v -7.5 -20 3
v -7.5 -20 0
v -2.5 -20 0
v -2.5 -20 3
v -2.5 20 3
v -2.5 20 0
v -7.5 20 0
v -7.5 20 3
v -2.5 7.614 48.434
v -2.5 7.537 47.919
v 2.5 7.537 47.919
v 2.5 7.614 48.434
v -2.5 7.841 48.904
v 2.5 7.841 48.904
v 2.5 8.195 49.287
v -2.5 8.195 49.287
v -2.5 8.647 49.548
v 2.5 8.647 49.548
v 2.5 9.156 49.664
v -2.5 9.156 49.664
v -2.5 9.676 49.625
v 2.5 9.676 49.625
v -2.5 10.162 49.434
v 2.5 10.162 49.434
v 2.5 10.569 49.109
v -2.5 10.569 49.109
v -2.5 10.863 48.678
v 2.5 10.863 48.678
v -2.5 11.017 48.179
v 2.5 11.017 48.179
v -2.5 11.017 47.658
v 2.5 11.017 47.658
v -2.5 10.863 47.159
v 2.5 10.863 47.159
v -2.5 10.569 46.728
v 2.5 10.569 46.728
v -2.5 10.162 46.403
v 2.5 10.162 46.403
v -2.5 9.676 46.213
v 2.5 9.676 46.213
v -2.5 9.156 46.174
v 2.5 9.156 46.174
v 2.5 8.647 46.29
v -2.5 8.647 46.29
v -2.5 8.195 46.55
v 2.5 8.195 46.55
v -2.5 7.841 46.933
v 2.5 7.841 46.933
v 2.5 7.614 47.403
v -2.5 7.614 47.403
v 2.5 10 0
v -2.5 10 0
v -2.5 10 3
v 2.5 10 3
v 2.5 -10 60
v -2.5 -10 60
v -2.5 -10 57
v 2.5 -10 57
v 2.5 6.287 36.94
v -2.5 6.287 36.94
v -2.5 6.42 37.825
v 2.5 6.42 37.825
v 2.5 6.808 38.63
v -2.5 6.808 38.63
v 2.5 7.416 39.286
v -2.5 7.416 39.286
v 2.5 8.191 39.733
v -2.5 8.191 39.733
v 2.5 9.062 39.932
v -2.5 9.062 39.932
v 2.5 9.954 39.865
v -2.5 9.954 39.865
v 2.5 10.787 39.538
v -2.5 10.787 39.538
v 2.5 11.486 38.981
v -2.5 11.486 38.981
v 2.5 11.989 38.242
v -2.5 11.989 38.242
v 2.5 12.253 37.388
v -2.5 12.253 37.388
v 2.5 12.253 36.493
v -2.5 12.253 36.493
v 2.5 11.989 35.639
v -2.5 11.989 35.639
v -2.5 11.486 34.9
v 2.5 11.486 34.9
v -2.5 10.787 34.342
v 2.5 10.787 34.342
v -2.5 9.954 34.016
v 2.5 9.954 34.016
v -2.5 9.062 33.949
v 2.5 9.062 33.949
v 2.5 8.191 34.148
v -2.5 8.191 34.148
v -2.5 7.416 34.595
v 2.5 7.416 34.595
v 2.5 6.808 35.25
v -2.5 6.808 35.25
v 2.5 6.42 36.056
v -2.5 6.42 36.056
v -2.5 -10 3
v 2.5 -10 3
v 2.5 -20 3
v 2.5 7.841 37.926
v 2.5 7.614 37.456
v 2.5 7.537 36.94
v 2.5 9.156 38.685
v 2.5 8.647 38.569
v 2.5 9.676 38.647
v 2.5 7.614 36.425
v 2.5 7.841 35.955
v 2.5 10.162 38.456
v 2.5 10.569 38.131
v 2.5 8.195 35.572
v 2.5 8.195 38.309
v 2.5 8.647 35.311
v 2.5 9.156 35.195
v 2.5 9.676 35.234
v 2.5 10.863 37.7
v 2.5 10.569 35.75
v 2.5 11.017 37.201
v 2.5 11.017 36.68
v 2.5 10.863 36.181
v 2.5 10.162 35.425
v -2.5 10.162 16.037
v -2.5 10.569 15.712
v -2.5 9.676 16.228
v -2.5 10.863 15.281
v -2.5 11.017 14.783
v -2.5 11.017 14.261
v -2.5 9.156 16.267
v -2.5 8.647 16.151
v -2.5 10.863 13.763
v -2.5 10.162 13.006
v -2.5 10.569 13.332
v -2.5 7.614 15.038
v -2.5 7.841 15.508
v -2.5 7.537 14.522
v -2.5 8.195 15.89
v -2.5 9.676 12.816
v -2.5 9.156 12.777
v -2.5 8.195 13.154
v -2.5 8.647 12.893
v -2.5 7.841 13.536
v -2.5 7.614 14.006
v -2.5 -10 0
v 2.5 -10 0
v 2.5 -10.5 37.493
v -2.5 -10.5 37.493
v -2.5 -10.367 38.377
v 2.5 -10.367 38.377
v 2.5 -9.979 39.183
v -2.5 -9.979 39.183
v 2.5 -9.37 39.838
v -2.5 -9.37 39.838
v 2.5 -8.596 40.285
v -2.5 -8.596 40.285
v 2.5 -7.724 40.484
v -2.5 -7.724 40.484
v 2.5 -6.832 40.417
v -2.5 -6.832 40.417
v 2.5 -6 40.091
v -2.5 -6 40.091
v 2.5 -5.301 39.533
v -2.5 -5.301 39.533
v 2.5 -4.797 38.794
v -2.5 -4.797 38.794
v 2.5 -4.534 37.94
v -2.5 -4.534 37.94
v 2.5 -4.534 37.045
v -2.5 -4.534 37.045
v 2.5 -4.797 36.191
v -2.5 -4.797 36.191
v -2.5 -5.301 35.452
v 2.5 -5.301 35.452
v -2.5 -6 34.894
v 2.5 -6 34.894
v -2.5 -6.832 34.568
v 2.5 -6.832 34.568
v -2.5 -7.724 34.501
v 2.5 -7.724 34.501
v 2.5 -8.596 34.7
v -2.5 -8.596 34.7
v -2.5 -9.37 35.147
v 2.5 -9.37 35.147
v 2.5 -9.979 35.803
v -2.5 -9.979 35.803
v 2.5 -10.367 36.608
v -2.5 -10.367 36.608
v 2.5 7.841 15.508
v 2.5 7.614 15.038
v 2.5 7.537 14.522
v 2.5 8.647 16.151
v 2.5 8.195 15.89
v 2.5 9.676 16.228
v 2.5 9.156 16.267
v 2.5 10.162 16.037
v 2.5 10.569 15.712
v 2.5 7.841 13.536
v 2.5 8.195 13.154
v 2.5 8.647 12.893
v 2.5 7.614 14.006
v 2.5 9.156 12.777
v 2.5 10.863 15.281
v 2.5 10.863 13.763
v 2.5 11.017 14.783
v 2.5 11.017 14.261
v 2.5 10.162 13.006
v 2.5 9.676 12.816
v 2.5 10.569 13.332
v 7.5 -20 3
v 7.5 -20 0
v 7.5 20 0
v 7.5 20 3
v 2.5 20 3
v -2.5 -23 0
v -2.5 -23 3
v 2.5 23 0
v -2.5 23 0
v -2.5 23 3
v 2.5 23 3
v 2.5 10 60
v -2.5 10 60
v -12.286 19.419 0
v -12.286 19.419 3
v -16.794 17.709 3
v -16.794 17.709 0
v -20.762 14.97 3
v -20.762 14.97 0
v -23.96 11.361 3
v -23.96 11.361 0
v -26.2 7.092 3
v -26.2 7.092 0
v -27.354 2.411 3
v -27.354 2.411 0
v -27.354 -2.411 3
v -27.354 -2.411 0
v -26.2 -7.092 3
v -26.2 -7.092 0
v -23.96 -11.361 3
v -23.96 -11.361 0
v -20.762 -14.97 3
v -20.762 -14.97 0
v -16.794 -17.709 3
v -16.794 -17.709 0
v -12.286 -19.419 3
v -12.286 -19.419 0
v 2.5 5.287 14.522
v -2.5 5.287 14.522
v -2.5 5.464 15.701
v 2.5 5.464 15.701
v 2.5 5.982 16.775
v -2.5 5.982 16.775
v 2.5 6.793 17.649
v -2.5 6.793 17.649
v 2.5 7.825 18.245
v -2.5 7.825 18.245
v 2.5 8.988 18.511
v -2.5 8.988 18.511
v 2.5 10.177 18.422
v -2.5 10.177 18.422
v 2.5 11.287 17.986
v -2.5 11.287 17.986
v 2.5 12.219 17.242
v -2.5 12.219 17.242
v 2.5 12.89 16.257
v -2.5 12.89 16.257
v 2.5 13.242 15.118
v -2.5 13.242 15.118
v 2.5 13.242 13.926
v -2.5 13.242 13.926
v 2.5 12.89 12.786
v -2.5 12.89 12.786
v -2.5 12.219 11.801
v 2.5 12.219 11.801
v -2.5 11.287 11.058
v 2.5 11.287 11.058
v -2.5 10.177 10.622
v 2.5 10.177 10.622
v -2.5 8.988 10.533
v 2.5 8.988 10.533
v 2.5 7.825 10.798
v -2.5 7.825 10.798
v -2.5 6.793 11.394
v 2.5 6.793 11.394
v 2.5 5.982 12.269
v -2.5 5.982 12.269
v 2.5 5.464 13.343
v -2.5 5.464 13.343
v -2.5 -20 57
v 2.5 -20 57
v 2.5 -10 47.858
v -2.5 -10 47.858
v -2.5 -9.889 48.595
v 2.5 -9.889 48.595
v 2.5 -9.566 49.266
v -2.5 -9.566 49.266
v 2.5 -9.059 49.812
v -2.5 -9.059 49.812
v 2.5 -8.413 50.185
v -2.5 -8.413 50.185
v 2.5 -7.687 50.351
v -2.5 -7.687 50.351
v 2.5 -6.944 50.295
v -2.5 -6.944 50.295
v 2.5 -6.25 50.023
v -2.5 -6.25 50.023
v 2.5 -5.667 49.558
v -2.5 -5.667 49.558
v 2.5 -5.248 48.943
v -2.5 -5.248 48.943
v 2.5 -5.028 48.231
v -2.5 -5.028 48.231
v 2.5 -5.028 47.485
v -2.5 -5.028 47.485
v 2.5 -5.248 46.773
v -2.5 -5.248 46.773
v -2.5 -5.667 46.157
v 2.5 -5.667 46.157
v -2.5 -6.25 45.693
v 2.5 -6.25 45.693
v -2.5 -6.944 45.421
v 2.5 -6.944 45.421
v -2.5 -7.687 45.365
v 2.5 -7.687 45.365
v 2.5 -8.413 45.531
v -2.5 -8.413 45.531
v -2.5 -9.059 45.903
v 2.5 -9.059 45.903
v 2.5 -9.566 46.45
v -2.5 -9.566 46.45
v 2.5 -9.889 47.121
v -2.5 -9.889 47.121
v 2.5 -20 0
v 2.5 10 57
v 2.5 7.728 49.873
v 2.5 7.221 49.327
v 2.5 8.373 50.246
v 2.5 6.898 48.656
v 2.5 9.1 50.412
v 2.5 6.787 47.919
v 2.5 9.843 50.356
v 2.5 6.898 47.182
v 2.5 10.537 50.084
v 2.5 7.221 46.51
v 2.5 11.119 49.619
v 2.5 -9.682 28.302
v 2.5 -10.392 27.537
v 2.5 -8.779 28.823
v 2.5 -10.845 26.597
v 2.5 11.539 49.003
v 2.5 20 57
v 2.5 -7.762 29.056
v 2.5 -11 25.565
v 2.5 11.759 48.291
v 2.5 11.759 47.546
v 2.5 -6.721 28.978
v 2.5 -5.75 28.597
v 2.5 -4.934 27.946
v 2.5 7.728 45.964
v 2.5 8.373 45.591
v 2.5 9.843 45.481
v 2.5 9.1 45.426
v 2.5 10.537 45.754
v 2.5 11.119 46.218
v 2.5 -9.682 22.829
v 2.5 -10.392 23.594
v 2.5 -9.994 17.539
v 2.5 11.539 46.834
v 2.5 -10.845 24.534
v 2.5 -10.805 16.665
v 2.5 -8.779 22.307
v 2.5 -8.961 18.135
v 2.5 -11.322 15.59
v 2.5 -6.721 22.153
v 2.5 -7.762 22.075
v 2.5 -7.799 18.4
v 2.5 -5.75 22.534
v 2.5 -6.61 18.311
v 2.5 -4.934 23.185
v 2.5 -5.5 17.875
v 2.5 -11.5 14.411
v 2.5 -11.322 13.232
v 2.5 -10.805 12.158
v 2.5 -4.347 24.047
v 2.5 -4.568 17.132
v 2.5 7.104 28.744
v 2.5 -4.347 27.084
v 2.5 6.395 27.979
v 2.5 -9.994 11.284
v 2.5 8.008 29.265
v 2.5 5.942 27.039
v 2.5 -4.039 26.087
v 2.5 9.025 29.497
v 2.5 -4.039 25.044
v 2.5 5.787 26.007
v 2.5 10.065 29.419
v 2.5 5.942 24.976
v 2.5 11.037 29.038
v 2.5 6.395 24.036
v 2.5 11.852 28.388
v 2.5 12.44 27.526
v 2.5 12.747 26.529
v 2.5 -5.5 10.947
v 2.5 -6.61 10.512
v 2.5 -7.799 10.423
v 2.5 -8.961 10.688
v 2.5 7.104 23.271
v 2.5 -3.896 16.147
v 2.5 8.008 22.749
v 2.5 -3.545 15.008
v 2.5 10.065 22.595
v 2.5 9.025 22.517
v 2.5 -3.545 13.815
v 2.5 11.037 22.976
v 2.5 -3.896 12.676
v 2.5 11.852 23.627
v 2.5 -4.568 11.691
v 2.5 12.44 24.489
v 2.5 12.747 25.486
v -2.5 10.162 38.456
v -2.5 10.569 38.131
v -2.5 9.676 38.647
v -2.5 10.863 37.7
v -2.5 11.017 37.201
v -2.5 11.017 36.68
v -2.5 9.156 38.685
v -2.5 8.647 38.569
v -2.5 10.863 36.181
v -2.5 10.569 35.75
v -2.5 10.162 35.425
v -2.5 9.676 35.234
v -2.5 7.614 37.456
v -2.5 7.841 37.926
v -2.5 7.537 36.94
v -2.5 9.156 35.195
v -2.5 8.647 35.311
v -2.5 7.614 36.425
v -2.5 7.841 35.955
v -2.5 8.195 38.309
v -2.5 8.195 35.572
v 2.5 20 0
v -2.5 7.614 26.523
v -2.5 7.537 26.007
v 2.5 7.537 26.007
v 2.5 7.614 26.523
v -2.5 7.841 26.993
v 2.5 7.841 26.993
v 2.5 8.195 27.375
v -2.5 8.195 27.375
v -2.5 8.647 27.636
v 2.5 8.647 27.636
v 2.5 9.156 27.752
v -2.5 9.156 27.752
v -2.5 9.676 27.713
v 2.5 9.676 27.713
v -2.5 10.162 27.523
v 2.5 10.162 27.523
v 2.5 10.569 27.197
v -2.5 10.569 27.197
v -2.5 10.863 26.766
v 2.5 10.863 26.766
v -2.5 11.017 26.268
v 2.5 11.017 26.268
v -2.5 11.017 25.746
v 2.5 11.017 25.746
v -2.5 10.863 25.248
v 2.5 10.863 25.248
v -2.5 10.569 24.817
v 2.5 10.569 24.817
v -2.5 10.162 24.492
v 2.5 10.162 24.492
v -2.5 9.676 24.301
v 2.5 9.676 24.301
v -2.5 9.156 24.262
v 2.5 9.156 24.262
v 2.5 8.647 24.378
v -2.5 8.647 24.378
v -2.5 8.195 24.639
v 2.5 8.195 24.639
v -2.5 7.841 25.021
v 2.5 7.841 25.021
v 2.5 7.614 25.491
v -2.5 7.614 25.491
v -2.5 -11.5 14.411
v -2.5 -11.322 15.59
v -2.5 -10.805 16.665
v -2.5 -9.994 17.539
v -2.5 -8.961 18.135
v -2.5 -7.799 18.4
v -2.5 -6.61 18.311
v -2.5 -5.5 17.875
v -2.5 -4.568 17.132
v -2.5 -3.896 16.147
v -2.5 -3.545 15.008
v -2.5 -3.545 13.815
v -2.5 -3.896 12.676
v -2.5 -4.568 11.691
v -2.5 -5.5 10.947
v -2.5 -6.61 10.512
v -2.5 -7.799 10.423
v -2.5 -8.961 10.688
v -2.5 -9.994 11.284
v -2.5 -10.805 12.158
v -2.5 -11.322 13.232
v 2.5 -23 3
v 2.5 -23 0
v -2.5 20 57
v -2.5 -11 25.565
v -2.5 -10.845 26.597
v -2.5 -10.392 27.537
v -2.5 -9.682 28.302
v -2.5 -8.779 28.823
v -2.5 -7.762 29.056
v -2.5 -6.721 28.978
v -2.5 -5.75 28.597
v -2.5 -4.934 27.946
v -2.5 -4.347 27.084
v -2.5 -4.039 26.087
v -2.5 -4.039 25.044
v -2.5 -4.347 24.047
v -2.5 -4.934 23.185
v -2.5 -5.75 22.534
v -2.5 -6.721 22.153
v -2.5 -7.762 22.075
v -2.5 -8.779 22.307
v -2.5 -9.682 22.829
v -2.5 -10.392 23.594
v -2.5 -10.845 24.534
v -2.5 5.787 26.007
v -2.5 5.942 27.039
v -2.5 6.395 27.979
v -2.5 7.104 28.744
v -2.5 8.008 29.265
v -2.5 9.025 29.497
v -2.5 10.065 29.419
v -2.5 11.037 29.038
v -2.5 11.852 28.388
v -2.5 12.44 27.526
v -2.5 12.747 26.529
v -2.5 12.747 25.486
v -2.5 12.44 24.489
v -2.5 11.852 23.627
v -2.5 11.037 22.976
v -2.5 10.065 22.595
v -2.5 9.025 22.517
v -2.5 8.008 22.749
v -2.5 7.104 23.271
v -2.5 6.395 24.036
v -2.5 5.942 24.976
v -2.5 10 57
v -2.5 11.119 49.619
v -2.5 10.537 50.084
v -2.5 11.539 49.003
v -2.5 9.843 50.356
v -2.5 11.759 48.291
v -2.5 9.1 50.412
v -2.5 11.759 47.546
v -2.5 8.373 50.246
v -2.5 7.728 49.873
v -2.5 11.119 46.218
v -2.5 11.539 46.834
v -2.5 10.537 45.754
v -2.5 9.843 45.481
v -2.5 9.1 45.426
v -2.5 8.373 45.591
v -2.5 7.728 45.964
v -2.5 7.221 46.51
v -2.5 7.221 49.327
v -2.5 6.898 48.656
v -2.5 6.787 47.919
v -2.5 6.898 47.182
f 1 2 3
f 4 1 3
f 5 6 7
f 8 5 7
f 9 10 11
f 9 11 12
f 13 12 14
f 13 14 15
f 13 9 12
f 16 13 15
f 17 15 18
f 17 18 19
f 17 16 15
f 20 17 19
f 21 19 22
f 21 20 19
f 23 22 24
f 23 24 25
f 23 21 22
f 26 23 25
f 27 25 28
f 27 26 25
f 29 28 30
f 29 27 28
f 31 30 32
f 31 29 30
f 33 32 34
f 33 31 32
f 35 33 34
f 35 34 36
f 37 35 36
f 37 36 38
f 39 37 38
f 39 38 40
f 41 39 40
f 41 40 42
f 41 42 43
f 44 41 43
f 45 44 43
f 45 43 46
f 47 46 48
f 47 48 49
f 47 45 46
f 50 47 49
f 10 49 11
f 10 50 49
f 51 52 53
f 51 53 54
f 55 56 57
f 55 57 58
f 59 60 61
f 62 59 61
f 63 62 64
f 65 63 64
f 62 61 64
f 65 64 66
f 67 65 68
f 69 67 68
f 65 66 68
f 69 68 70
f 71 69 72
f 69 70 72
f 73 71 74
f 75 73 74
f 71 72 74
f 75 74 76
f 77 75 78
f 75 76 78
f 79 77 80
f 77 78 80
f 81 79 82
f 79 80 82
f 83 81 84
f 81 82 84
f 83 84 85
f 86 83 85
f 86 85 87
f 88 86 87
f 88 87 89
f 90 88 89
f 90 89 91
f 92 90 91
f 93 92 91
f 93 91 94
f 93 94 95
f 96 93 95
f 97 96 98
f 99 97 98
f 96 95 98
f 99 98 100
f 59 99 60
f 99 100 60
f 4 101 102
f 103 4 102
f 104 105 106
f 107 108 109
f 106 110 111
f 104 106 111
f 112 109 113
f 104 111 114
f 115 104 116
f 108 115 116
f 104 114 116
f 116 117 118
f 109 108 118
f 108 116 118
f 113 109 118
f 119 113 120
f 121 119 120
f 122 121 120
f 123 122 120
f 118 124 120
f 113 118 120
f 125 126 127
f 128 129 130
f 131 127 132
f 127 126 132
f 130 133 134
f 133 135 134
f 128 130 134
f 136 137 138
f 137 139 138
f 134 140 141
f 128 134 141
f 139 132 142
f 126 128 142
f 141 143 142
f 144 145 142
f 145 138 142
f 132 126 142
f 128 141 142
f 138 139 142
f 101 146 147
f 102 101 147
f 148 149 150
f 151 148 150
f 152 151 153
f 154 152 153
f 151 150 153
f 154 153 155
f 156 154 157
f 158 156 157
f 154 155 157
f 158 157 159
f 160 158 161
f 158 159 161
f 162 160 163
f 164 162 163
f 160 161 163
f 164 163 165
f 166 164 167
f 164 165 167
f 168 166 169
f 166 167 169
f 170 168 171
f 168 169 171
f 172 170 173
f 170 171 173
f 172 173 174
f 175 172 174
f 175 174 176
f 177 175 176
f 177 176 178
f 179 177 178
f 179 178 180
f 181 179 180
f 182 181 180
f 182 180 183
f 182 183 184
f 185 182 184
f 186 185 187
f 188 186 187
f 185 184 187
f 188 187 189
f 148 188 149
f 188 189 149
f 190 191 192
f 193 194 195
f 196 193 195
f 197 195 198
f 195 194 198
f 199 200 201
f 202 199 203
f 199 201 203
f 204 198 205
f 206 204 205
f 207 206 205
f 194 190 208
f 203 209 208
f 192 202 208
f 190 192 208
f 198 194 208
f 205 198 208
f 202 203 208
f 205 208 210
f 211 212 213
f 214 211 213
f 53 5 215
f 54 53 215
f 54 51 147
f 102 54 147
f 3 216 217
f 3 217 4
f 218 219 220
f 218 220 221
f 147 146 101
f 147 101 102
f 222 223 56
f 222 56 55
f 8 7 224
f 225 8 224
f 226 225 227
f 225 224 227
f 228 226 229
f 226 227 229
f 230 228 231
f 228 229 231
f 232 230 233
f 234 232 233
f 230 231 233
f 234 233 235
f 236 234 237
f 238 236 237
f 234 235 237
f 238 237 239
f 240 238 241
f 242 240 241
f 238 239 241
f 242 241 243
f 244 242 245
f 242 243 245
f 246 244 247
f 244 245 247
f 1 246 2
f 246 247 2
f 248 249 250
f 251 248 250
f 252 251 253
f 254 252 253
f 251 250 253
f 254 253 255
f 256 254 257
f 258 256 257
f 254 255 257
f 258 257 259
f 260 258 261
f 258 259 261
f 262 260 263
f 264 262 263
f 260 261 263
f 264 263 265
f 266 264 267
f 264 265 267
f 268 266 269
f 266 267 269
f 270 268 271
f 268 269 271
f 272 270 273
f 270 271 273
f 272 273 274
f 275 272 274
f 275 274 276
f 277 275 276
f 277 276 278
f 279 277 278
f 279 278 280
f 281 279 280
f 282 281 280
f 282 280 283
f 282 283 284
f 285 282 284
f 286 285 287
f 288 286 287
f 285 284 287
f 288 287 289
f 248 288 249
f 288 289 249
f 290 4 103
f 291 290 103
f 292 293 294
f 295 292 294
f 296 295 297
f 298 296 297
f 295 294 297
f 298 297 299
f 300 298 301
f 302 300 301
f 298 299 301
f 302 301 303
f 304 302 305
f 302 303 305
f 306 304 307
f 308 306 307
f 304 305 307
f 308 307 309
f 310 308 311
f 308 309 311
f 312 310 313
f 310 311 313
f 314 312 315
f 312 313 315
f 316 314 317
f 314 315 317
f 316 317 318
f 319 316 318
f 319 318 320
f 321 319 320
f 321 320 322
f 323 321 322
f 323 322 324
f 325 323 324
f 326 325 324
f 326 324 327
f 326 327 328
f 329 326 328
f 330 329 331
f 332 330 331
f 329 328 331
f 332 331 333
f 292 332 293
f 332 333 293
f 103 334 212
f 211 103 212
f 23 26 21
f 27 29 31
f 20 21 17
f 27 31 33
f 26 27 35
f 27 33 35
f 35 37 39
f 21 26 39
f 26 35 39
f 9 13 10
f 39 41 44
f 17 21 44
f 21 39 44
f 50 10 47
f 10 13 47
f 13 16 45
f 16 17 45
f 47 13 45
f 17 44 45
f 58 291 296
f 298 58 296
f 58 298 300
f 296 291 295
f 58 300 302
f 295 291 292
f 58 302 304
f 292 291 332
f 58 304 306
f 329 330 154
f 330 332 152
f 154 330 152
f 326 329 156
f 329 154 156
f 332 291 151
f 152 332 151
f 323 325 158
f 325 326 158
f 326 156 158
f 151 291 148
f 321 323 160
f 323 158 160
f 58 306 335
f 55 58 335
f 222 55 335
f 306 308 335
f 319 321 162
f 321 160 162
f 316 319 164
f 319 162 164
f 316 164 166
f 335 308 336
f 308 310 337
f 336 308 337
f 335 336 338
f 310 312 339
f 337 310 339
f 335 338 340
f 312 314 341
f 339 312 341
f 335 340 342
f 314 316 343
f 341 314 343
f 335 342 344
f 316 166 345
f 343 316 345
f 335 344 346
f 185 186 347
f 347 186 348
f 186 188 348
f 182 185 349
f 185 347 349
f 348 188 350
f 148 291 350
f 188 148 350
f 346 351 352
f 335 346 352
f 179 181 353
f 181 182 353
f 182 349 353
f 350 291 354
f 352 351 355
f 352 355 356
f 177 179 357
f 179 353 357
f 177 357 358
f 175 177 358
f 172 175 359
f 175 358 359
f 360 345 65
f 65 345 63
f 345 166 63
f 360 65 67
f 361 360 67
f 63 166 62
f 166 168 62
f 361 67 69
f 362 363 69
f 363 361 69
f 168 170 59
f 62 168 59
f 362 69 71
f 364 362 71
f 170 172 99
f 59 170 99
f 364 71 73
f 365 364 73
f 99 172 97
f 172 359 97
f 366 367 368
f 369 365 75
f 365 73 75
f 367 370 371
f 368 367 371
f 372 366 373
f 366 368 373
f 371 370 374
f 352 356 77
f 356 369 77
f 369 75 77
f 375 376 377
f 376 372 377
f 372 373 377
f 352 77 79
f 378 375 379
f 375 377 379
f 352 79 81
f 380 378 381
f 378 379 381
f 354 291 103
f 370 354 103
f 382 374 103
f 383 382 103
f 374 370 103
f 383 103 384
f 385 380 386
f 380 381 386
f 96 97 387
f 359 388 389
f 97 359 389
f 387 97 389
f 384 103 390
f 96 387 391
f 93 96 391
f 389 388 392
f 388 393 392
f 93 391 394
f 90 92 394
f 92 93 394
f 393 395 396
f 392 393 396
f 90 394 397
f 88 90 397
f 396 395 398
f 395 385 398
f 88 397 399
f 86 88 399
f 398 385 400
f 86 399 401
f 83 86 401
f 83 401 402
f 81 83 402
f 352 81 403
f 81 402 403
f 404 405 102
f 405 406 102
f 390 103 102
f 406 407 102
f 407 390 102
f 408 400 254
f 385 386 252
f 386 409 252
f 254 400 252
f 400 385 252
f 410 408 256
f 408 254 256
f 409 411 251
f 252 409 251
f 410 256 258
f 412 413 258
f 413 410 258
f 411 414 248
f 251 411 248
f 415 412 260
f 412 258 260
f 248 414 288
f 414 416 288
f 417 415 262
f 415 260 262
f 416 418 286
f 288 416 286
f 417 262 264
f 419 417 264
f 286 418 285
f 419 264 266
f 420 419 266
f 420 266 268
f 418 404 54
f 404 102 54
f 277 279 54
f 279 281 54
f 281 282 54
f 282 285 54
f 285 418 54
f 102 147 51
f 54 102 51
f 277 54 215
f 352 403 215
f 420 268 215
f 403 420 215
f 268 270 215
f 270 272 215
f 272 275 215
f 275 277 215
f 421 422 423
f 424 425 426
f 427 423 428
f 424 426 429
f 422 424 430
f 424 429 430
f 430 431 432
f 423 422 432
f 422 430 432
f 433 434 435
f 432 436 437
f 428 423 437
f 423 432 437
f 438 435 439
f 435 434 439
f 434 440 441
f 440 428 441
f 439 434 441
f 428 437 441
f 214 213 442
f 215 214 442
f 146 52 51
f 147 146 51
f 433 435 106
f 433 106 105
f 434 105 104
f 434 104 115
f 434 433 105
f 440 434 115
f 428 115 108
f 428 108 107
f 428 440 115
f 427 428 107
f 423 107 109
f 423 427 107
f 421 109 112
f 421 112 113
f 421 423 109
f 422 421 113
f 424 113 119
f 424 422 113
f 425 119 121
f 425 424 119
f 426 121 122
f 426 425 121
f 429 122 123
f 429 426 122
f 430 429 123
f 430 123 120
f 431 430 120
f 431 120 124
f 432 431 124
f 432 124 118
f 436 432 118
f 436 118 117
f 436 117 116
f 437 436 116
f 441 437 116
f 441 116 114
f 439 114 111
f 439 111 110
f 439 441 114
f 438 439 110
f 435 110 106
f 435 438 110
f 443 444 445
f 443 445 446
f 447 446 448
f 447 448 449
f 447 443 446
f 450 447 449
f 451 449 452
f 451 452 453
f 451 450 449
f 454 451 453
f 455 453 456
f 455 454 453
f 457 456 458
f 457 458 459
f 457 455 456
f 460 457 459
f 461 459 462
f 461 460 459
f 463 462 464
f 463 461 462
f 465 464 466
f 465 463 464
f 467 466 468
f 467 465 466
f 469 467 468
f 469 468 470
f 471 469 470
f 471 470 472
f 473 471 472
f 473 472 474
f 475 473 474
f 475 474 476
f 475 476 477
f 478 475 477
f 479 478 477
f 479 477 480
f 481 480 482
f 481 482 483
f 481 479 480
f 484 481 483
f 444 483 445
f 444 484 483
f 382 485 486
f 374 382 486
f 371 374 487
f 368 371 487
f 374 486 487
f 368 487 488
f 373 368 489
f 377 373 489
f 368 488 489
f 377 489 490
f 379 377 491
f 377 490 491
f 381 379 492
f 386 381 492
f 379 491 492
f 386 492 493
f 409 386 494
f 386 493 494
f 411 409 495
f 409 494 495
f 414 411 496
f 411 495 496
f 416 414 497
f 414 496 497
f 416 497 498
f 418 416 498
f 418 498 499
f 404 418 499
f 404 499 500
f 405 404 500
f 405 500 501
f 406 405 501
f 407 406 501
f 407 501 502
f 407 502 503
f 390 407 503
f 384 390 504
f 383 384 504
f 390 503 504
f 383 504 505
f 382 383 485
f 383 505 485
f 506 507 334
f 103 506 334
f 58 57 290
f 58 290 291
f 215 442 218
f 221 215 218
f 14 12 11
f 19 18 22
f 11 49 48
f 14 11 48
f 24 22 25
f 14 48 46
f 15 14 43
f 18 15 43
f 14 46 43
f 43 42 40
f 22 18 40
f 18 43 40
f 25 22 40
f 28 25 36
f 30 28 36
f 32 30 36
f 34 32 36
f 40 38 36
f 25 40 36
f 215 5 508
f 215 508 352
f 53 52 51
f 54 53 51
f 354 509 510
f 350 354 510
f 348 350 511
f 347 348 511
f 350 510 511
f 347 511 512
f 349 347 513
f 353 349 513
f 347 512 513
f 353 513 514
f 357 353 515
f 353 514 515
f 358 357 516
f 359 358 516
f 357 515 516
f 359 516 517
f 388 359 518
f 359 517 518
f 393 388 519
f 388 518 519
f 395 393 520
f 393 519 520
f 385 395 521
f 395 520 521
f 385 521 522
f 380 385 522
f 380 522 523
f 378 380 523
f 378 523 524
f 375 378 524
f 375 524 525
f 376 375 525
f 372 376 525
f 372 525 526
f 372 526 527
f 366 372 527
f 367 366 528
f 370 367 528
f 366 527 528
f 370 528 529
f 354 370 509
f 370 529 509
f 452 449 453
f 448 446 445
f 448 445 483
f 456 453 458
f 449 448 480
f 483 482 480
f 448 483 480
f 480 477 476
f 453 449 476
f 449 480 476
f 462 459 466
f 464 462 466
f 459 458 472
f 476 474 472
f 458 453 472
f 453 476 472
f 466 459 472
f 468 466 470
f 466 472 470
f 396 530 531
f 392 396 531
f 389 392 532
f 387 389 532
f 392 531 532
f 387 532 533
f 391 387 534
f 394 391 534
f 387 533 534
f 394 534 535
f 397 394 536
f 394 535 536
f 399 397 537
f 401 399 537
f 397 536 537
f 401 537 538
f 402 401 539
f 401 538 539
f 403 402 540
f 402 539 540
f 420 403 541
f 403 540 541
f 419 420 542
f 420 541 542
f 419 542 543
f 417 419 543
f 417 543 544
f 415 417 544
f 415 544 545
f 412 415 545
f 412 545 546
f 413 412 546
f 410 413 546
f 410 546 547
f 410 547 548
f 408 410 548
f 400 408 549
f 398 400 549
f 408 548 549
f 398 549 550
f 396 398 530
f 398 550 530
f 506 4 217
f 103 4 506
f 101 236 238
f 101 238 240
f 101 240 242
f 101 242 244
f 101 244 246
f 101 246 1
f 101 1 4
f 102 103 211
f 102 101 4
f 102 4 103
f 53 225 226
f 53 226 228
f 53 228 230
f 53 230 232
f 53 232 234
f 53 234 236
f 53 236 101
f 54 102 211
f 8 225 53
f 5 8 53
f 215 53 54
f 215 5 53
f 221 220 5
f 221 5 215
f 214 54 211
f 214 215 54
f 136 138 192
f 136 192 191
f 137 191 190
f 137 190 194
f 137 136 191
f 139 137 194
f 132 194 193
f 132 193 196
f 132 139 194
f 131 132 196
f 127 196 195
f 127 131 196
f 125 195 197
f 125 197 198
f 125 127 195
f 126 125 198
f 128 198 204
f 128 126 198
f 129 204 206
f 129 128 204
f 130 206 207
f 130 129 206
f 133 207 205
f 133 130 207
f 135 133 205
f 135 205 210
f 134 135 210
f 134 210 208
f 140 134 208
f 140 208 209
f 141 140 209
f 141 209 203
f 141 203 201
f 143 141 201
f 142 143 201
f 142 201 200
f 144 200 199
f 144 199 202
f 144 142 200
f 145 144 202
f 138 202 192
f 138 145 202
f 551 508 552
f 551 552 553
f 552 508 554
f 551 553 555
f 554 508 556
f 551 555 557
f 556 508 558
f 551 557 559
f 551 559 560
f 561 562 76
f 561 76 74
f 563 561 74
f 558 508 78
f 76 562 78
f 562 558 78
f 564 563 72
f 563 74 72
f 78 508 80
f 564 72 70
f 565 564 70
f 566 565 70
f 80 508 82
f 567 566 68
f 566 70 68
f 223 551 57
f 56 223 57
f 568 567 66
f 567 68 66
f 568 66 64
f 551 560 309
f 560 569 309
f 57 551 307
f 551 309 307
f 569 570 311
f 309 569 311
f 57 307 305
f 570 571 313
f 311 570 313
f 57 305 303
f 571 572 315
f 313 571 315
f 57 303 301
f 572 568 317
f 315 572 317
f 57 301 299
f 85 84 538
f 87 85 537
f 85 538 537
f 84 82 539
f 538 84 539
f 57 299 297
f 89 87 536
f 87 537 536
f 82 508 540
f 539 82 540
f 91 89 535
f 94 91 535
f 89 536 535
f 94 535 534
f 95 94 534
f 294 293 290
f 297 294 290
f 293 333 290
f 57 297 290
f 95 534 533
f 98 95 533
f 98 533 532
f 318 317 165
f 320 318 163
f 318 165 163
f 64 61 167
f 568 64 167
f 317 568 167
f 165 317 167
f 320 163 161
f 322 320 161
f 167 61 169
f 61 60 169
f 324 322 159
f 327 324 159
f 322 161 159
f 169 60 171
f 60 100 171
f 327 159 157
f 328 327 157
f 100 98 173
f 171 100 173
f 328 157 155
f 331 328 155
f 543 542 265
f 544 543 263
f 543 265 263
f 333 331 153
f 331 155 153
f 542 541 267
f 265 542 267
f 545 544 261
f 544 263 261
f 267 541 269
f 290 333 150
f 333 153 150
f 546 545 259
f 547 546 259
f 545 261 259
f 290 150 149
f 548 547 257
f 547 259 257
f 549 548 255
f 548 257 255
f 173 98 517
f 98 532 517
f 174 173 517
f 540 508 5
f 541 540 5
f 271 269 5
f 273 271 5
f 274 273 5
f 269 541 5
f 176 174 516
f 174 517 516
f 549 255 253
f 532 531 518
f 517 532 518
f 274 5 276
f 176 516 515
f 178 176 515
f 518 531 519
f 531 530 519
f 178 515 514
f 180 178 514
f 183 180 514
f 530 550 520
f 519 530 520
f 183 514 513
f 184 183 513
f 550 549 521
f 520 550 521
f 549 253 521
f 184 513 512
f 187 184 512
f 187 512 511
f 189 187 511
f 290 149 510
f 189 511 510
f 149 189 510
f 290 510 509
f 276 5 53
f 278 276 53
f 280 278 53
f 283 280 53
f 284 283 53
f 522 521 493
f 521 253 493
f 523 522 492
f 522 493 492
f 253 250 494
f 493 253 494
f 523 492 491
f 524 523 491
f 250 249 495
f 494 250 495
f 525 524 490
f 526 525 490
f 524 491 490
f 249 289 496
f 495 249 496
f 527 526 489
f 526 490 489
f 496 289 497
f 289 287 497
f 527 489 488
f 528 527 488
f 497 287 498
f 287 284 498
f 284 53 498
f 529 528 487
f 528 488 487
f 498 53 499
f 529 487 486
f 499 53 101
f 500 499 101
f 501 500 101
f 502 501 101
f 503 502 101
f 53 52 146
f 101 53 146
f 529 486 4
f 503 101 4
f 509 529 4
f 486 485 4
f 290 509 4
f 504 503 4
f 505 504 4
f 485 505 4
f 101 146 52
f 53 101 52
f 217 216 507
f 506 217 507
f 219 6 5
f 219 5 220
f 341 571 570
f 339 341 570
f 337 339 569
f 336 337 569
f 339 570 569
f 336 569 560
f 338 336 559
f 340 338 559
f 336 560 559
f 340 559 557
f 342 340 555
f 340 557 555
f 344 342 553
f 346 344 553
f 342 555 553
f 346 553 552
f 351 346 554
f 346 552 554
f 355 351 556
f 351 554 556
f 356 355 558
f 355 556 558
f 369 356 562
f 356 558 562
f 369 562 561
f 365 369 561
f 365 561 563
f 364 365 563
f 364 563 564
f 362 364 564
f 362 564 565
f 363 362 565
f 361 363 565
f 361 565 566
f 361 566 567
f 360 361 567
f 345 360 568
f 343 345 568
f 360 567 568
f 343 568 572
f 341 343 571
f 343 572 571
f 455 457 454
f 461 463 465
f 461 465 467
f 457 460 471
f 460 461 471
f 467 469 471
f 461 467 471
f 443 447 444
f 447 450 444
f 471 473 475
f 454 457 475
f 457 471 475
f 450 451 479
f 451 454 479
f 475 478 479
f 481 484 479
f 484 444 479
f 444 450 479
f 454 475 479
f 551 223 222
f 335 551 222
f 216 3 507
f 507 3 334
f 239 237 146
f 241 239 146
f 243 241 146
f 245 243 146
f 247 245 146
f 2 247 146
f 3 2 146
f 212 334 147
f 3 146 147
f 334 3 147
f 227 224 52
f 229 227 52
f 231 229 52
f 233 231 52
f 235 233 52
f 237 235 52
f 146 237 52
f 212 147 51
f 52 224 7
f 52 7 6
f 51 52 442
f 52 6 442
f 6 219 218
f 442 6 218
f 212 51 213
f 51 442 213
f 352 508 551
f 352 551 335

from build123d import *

# Parameters (mm, degrees)
F0_W     = 5
F0_H     = 3
F0_H_2   = 10
F1_DEPTH = 3
F0_H_3   = 20
F2_DEPTH = 60
F3_DEPTH = 3
F4_W     = 5
F4_H     = 10
F5_DEPTH = 3
F6_R     = 2.5
F6_R_2   = 3
F6_R_3   = 3.5
F6_R_4   = 4
F6_R_5   = 1.75
F7_DEPTH = 5


with BuildPart() as f1:
    # F0 (on Top) → F1 (new body)
    with BuildSketch(Plane.XY):
        with BuildLine():
            Line((-7.5, -20), (-7.5, 20))
            ThreePointArc((-7.5, 20), (-27.5, 0), (-7.5, -20))
        make_face()
        Polygon((7.5, -20), (7.5, 20), (2.5, 20), (2.5, 10), (2.5, -10), (2.5, -20), align=None)
        with Locations((0, 21.5)):
            Rectangle(F0_W, F0_H)
        with Locations((0, -21.5)):
            Rectangle(F0_W, F0_H)
        Polygon((-2.5, 10), (-2.5, 20), (-7.5, 20), (-7.5, -20), (-2.5, -20), (-2.5, -10), align=None)
        with Locations((0, 15)):
            Rectangle(F0_W, F0_H_2)
        with Locations((0, -15)):
            Rectangle(F0_W, F0_H_2)
    extrude(amount=F1_DEPTH)


with BuildPart() as f2:
    # F0 (on Top) → F2 (new body)
    with BuildSketch(Plane.XY):
        Rectangle(F0_W, F0_H_3)
        with Locations((0, 15)):
            Rectangle(F0_W, F0_H_2)
        with Locations((0, -15)):
            Rectangle(F0_W, F0_H_2)
    extrude(amount=F2_DEPTH)

    # F0 (on Top) → F3 (cut)
    with BuildSketch(Plane.XY):
        with Locations((0, 15)):
            Rectangle(F0_W, F0_H_2)
        with Locations((0, -15)):
            Rectangle(F0_W, F0_H_2)
    extrude(amount=F3_DEPTH, mode=Mode.SUBTRACT)

    # F4 (on face) → F5 (cut)
    with BuildSketch(Plane.XY.offset(60)):
        with Locations((0, -15)):
            Rectangle(F4_W, F4_H)
        with Locations((0, 15)):
            Rectangle(F4_W, F4_H)
    extrude(amount=-F5_DEPTH, mode=Mode.SUBTRACT)

    # F6 (on face) → F7 (cut, through all)
    with BuildSketch(Plane(origin=(-2.5, 0, 0), x_dir=(0, -1, 0), z_dir=(-1, 0, 0))):
        with Locations((7.5, 47.8578992188)):
            Circle(F6_R)
        with Locations((7.5, 37.4925732613)):
            Circle(F6_R_2)
        with Locations((7.5, 25.5654416978)):
            Circle(F6_R_3)
        with Locations((7.5, 14.4113665447)):
            Circle(F6_R_4)
        with Locations((-9.2865563929, 14.5218027756)):
            Circle(F6_R_4)
        with Locations((-9.2865563929, 14.5218027756)):
            Circle(F6_R_5, mode=Mode.SUBTRACT)
        with Locations((-9.2865563929, 26.0071866214)):
            Circle(F6_R_3)
        with Locations((-9.2865563929, 26.0071866214)):
            Circle(F6_R_5, mode=Mode.SUBTRACT)
        with Locations((-9.2865563929, 36.9403921068)):
            Circle(F6_R_2)
        with Locations((-9.2865563929, 36.9403921068)):
            Circle(F6_R_5, mode=Mode.SUBTRACT)
        with Locations((-9.2865563929, 47.9186363518)):
            Circle(F6_R)
        with Locations((-9.2865563929, 47.9186363518)):
            Circle(F6_R_5, mode=Mode.SUBTRACT)
    extrude(amount=-F7_DEPTH, mode=Mode.SUBTRACT)


solid = Compound([f1.part, f2.part])
